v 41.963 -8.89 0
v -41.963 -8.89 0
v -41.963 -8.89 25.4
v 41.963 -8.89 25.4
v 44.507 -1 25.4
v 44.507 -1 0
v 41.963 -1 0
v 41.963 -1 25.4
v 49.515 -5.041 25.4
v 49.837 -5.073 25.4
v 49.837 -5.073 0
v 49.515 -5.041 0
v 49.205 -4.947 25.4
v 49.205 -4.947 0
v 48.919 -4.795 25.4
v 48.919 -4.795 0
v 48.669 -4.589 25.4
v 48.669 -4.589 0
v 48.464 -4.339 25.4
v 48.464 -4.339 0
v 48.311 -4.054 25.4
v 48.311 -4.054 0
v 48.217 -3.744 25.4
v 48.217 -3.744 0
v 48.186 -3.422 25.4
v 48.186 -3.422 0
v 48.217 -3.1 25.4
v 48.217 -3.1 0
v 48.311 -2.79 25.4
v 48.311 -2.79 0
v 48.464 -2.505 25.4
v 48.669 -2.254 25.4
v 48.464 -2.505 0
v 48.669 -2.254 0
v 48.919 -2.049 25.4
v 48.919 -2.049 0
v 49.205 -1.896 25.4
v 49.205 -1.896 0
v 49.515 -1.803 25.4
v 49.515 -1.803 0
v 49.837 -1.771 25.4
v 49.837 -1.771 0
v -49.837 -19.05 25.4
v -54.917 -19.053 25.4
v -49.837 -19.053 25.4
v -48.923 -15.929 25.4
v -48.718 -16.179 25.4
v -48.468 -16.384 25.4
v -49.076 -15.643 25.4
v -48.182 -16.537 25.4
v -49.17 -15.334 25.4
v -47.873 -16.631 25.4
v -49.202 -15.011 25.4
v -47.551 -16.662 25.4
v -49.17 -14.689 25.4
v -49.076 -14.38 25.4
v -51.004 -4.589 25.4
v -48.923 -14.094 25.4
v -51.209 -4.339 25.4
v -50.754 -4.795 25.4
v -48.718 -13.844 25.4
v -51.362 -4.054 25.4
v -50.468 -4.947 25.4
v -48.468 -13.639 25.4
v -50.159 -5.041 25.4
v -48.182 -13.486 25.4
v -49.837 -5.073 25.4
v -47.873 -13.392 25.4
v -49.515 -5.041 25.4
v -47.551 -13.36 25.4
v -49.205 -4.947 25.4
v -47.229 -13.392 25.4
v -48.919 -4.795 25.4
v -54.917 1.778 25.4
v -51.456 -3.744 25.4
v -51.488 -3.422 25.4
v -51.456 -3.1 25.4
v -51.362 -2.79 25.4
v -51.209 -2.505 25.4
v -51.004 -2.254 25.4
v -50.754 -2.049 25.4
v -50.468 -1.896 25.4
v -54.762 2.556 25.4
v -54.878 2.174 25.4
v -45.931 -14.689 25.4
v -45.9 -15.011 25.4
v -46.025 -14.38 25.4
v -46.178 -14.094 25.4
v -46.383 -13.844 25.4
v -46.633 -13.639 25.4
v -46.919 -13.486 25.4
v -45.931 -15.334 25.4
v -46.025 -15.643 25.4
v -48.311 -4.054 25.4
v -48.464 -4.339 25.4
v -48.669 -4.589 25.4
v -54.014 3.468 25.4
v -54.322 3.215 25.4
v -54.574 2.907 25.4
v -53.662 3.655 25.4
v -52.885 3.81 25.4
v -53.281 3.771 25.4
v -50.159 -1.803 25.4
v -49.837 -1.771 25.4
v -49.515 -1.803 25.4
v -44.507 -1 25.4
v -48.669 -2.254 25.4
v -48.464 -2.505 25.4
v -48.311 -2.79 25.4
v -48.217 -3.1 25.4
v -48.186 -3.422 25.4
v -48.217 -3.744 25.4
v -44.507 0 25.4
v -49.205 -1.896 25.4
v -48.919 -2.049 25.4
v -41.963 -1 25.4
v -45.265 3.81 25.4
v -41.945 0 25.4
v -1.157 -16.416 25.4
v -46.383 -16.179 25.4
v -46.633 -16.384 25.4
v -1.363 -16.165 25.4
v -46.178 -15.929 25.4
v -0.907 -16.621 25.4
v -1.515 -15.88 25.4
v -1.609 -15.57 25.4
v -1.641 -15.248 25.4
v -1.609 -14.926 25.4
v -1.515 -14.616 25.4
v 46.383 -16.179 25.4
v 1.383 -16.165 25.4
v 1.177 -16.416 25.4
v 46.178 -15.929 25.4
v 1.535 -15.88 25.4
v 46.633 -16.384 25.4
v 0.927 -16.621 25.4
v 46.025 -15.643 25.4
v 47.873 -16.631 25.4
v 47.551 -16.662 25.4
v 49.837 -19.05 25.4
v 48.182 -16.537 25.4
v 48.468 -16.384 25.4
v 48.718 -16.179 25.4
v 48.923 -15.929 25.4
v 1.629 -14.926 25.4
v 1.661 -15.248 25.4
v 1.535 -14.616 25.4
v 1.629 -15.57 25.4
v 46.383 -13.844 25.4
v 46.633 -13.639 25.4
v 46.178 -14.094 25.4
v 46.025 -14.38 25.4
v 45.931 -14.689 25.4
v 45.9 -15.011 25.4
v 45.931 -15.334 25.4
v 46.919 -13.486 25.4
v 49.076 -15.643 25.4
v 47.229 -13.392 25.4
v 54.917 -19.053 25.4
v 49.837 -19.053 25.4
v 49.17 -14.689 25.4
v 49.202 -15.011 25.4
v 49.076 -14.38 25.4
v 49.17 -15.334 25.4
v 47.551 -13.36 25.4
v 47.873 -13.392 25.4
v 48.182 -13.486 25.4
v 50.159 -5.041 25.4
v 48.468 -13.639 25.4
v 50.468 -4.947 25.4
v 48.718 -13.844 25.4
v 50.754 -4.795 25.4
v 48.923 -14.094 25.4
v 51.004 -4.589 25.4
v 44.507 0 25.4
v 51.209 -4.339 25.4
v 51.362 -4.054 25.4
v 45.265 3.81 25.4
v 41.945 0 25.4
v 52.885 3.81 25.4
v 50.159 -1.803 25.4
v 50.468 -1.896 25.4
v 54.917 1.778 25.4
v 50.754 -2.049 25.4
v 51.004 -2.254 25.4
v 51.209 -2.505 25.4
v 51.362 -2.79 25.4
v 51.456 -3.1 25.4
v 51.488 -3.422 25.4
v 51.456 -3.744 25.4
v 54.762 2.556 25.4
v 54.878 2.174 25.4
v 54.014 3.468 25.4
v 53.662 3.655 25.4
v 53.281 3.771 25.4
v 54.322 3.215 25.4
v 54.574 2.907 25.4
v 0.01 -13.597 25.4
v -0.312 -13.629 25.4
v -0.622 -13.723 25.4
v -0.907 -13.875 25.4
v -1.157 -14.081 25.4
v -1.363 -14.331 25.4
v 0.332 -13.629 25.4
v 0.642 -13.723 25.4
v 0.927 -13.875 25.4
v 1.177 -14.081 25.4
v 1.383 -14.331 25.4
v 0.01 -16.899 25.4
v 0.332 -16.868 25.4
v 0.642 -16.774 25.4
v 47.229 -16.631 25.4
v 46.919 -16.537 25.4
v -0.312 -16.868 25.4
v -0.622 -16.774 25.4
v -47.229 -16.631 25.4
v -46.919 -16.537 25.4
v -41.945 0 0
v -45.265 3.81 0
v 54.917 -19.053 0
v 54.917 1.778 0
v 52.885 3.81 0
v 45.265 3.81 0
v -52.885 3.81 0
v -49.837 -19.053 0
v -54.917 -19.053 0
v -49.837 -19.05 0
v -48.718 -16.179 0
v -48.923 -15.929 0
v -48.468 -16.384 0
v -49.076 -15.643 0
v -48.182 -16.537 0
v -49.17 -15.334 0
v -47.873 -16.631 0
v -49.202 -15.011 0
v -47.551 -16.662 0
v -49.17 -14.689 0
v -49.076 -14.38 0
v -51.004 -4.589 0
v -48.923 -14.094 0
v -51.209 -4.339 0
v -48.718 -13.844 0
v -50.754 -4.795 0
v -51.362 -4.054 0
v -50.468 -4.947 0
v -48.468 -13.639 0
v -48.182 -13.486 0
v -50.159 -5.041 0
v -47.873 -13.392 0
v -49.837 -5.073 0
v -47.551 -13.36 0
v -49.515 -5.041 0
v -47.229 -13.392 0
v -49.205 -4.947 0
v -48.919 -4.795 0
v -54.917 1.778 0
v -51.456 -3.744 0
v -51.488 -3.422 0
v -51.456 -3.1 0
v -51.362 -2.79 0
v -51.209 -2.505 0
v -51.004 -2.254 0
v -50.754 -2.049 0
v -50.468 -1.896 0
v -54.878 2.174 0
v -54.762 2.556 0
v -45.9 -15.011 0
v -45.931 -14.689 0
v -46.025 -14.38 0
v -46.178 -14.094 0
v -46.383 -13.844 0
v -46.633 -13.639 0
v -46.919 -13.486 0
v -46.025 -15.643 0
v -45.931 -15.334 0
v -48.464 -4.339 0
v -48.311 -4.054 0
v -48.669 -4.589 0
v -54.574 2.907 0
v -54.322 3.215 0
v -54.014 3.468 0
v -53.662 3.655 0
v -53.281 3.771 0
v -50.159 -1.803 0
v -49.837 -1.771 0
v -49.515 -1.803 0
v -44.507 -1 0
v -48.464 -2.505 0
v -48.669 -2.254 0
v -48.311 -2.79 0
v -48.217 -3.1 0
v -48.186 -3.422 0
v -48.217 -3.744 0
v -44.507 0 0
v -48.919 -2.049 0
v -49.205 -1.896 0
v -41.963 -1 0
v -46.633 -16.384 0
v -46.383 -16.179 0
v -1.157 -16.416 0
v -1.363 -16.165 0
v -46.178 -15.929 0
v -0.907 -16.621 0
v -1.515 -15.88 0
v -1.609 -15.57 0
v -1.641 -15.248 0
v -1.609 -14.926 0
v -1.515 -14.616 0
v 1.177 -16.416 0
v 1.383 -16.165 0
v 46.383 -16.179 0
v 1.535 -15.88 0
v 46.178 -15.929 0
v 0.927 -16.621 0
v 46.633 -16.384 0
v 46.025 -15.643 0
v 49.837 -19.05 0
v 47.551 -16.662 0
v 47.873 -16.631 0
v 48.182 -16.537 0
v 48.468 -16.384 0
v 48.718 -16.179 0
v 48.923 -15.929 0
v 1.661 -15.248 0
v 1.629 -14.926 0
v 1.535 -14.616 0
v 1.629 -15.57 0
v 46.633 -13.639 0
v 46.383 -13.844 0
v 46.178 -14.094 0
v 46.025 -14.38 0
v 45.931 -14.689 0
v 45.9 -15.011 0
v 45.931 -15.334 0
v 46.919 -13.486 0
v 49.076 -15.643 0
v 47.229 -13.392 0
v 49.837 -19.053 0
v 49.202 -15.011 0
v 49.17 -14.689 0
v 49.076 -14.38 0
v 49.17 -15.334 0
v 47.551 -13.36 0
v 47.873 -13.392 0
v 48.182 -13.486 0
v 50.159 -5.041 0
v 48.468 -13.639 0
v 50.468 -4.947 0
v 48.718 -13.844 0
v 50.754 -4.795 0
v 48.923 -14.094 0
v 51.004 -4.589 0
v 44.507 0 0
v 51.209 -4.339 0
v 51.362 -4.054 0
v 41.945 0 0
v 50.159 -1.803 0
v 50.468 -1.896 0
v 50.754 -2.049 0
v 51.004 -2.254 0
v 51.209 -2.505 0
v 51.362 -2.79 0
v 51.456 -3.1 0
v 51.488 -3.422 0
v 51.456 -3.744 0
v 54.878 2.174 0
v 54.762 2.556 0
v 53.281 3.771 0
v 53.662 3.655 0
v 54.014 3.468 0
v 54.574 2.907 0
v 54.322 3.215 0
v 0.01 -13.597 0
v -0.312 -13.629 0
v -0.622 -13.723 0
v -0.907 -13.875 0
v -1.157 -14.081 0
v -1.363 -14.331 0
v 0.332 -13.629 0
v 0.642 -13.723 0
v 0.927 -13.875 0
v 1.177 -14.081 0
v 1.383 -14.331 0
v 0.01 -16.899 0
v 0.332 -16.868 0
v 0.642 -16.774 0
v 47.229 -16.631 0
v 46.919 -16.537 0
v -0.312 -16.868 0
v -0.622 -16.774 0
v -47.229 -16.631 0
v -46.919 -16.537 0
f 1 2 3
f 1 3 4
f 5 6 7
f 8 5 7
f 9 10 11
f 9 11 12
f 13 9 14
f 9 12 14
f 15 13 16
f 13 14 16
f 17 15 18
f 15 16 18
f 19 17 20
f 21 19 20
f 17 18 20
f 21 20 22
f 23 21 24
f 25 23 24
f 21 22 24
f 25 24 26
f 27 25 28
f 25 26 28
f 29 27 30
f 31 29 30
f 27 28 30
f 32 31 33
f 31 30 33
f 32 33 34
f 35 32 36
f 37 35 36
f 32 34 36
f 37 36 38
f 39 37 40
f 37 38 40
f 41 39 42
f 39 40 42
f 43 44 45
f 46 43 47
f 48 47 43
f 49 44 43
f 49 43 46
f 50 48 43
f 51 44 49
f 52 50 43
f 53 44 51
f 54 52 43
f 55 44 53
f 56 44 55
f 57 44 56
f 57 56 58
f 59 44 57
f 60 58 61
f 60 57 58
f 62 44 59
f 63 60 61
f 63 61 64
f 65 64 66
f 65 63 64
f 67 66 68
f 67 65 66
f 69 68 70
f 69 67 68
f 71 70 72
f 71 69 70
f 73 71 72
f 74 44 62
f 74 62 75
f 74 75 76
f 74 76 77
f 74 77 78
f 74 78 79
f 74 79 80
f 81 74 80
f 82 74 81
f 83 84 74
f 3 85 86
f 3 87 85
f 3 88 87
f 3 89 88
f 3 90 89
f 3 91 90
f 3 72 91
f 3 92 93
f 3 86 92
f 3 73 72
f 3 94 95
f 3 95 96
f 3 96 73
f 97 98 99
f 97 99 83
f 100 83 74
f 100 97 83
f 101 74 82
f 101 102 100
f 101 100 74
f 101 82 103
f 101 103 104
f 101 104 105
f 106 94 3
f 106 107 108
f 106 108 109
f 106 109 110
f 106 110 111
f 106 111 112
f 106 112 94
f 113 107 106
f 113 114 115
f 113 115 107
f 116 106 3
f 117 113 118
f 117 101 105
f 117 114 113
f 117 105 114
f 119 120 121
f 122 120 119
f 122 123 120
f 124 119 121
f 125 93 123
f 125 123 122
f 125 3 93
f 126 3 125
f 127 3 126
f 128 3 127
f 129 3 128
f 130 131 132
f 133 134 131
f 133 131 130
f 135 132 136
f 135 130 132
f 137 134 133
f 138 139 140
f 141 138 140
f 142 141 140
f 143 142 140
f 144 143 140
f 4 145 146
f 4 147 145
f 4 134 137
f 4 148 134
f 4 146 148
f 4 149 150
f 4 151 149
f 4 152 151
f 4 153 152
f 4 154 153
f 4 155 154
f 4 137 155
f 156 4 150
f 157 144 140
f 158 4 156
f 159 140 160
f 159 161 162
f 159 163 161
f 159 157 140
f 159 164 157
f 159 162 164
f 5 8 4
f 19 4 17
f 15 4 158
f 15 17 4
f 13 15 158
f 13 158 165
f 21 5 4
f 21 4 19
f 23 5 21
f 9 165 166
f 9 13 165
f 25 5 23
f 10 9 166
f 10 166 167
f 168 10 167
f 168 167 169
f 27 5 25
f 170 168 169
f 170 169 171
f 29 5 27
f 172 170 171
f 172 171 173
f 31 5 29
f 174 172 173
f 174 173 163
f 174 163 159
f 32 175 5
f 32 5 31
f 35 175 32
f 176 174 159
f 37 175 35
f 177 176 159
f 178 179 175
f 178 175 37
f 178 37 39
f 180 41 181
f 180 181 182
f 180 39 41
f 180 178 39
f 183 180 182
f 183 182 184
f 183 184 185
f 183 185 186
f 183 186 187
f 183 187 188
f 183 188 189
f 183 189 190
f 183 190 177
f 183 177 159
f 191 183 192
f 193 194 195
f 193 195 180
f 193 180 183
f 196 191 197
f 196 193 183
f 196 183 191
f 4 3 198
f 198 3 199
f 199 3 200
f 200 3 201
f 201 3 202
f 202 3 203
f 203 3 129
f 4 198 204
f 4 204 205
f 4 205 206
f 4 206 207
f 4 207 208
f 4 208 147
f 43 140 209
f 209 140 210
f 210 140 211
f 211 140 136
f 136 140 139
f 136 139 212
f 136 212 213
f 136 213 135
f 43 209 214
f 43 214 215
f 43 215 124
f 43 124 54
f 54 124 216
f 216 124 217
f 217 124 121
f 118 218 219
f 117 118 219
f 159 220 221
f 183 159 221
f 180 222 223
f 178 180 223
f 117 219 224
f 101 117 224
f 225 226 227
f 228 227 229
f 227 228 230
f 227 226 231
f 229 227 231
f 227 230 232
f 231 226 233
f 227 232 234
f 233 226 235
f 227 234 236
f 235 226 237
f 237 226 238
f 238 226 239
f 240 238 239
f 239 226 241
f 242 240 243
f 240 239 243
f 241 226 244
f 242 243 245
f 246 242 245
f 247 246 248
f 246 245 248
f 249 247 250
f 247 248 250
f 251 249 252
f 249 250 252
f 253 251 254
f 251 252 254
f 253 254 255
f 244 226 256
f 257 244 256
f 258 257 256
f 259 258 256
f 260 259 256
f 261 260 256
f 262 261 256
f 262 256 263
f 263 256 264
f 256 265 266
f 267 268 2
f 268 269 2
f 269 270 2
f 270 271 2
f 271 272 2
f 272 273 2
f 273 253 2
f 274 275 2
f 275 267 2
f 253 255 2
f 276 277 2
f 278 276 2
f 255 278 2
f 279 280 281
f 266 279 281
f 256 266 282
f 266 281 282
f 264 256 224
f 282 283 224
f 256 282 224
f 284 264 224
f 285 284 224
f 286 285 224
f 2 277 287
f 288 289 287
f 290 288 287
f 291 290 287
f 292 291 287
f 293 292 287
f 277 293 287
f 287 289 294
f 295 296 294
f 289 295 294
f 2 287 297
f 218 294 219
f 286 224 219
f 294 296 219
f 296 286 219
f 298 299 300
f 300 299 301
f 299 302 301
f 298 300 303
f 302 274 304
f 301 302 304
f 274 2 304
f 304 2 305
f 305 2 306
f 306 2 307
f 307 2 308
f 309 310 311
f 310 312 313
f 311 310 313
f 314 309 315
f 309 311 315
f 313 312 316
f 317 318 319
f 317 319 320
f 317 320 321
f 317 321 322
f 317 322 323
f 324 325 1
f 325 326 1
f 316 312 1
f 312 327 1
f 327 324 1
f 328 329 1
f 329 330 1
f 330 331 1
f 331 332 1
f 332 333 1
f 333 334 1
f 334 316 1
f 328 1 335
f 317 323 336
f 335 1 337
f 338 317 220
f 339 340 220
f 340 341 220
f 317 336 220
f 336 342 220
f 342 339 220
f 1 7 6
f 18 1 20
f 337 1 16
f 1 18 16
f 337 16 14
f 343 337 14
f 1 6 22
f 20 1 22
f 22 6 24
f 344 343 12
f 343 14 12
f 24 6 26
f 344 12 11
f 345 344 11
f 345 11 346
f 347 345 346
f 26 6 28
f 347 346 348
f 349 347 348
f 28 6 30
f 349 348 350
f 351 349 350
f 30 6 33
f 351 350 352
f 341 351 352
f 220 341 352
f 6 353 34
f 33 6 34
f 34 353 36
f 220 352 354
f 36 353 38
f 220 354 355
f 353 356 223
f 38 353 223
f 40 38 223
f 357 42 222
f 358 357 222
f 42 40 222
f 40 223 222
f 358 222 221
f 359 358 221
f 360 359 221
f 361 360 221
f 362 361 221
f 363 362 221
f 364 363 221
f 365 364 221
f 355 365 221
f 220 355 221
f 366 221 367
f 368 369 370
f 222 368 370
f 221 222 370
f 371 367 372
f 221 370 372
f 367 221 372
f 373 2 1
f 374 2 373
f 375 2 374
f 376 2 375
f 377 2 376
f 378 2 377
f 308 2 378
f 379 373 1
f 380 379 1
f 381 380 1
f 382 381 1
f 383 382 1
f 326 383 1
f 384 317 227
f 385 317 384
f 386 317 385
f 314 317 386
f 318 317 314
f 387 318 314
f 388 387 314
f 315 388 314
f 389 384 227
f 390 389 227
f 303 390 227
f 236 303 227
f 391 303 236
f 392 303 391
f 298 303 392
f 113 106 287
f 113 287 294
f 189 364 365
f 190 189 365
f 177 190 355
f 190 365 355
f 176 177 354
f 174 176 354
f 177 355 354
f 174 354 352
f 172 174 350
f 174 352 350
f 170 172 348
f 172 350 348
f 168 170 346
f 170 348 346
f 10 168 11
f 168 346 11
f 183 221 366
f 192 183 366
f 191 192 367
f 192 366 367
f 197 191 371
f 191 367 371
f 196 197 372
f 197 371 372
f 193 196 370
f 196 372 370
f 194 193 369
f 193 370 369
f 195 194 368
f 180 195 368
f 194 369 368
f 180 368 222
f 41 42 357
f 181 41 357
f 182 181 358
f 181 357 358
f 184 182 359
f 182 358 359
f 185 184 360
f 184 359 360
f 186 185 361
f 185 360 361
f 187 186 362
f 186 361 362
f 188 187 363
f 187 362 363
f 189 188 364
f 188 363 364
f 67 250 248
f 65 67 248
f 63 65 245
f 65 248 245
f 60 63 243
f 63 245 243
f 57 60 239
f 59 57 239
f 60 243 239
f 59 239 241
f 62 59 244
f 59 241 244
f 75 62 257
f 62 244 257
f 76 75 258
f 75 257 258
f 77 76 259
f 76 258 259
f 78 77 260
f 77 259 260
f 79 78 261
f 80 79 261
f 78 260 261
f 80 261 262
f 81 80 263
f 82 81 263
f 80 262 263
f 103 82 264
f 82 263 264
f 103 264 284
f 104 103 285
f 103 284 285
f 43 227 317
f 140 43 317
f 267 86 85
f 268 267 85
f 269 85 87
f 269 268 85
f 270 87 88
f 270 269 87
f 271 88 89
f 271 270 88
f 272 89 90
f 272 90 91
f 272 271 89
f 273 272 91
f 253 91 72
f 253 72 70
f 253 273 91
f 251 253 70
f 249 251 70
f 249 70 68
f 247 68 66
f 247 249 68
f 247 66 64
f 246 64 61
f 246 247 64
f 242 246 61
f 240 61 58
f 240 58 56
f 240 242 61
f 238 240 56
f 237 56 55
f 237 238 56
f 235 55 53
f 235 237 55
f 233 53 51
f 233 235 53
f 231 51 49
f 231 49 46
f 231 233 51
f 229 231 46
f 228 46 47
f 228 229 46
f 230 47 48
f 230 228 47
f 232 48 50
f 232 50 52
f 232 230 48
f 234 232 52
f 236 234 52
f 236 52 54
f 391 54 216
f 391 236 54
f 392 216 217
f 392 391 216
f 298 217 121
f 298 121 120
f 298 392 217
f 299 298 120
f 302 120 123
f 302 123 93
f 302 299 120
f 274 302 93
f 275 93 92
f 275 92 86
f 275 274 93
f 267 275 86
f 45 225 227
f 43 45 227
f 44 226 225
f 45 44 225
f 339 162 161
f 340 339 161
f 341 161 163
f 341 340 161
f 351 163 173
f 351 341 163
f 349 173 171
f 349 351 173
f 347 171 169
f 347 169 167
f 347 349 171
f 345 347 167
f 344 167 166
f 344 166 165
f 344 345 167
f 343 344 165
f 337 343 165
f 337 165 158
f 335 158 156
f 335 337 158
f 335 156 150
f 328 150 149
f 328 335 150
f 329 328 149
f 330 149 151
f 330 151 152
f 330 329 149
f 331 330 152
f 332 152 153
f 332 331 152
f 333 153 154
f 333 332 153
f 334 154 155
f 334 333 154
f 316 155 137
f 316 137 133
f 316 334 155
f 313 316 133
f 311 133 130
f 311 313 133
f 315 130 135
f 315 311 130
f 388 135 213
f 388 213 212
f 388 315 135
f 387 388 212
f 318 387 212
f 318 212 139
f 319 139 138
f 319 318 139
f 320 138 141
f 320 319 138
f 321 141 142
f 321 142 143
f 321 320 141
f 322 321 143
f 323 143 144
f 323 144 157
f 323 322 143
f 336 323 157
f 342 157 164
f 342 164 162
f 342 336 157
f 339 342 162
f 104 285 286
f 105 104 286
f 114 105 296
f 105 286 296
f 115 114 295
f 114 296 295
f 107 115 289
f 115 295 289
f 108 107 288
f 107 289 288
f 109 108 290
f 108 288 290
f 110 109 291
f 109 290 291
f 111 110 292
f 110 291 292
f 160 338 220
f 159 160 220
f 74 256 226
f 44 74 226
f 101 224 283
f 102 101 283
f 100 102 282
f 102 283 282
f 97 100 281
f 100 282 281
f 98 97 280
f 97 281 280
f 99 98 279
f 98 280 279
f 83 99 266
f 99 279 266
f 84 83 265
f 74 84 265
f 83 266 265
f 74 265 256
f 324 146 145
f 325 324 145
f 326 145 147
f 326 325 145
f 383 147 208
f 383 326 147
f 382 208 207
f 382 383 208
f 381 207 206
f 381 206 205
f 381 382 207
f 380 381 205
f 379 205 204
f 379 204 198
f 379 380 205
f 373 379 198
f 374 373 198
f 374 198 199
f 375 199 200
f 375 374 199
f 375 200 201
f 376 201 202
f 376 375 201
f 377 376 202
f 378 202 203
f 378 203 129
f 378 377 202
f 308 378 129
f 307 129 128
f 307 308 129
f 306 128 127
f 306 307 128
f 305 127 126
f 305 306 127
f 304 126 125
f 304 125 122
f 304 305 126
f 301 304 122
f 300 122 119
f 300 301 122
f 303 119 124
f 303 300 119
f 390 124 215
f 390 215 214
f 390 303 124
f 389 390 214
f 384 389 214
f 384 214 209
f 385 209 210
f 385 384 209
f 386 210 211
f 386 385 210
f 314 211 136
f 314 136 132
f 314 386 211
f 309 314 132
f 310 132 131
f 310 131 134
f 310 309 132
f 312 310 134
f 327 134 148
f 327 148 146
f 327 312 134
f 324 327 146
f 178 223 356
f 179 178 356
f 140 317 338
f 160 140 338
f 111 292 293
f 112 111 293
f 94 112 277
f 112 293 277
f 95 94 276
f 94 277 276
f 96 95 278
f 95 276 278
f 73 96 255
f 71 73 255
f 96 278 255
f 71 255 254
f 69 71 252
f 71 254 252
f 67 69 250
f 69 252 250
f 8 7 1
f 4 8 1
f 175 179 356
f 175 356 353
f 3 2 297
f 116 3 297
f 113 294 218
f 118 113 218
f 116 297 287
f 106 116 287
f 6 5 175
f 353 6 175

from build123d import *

# Parameters (mm, degrees)
F0_R     = 1.651
F0_W     = 83.9253333333
F0_H     = 2.54
F0_W_2   = 0.7576921484
F0_H_2   = 0.9999891111
F1_DEPTH = 25.4


with BuildPart() as f1:
    # F0 (on Top) → F1 (new body)
    with BuildSketch(Plane.XY):
        Polygon((-45.2646666667, -11.43), (-49.8366666667, -11.43), (-49.8366666667, -19.05), (49.8366666667, -19.05), (49.8366666667, -11.43), (45.2646666667, -11.43), (41.9626666667, -11.43), (-41.9626666667, -11.43), align=None)
        with Locations((-47.5506666667, -15.0114614516)):
            Circle(F0_R, mode=Mode.SUBTRACT)
        with Locations((0.0100299507, -15.2482278645)):
            Circle(F0_R, mode=Mode.SUBTRACT)
        with Locations((47.5506666667, -15.0114614516)):
            Circle(F0_R, mode=Mode.SUBTRACT)
        with BuildLine():
            Line((-49.8366666667, -19.05), (-49.8366666667, -11.43))
            Line((-49.8366666667, -11.43), (-49.8366666667, -5.0728137152))
            ThreePointArc((-49.8366666667, -5.0728137152), (-51.4876666667, -3.4218137152), (-49.8366666667, -1.7708137152))
            Line((-49.8366666667, -1.7708137152), (-49.8366666667, 1.778))
            Line((-49.8366666667, 1.778), (-54.9166666667, 1.778))
            Line((-54.9166666667, 1.778), (-54.9166666667, -19.05301027))
            Line((-54.9166666667, -19.05301027), (-49.8366666667, -19.05301027))
            Line((-49.8366666667, -19.05301027), (-49.8366666667, -19.05))
        make_face()
        Polygon((-45.2646666667, -0.9999891111), (-45.2646666667, -11.43), (-41.9626666667, -11.43), (-41.9626666667, -8.89), (-41.9626666667, -0.9999891111), (-44.5069745183, -0.9999891111), align=None)
        with Locations((0, -10.16)):
            Rectangle(F0_W, F0_H)
        with Locations((-44.8858205925, -0.4999945555)):
            Rectangle(F0_W_2, F0_H_2)
        with BuildLine():
            Line((49.8366666667, -11.43), (49.8366666667, -19.05))
            Line((49.8366666667, -19.05), (49.8366666667, -19.05301027))
            Line((49.8366666667, -19.05301027), (54.9166666667, -19.05301027))
            Line((54.9166666667, -19.05301027), (54.9166666667, 1.778))
            Line((54.9166666667, 1.778), (49.8366666667, 1.778))
            Line((49.8366666667, 1.778), (49.8366666667, -1.7708137152))
            ThreePointArc((49.8366666667, -1.7708137152), (51.0040999624, -2.2543804195), (51.4876666667, -3.4218137152))
            ThreePointArc((51.4876666667, -3.4218137152), (51.0040999624, -4.589247011), (49.8366666667, -5.0728137152))
            Line((49.8366666667, -5.0728137152), (49.8366666667, -11.43))
        make_face()
        Polygon((41.9626666667, -8.89), (41.9626666667, -11.43), (45.2646666667, -11.43), (45.2646666667, -0.9999891111), (44.5069745183, -0.9999891111), (41.9626666667, -0.9999891111), align=None)
        Polygon((-45.2646666667, 1.778), (-45.2646666667, 0), (-44.5069745183, 0), (-41.94509238, 0), (-45.2646666667, 3.81), align=None)
        with BuildLine():
            Line((-54.9166666667, 1.778), (-49.8366666667, 1.778))
            Line((-49.8366666667, 1.778), (-45.2646666667, 1.778))
            Line((-45.2646666667, 1.778), (-45.2646666667, 3.81))
            Line((-45.2646666667, 3.81), (-52.8846666667, 3.81))
            ThreePointArc((-52.8846666667, 3.81), (-54.321507646, 3.2148409794), (-54.9166666667, 1.778))
        make_face()
        with Locations((44.8858205925, -0.4999945555)):
            Rectangle(F0_W_2, F0_H_2)
        with BuildLine():
            Line((49.8366666667, 1.778), (54.9166666667, 1.778))
            ThreePointArc((54.9166666667, 1.778), (54.321507646, 3.2148409794), (52.8846666667, 3.81))
            Line((52.8846666667, 3.81), (47.8046666667, 3.81))
            Line((47.8046666667, 3.81), (45.2646666667, 3.81))
            Line((45.2646666667, 3.81), (45.2646666667, 1.778))
            Line((45.2646666667, 1.778), (49.8366666667, 1.778))
        make_face()
        Polygon((44.5069745183, 0), (45.2646666667, 0), (45.2646666667, 1.778), (45.2646666667, 3.81), (41.94509238, 0), align=None)
        with BuildLine():
            Line((-49.8366666667, -5.0728137152), (-49.8366666667, -11.43))
            Line((-49.8366666667, -11.43), (-45.2646666667, -11.43))
            Line((-45.2646666667, -11.43), (-45.2646666667, -0.9999891111))
            Line((-45.2646666667, -0.9999891111), (-45.2646666667, 0))
            Line((-45.2646666667, 0), (-45.2646666667, 1.778))
            Line((-45.2646666667, 1.778), (-49.8366666667, 1.778))
            Line((-49.8366666667, 1.778), (-49.8366666667, -1.7708137152))
            ThreePointArc((-49.8366666667, -1.7708137152), (-48.6692333709, -2.2543804195), (-48.1856666667, -3.4218137152))
            ThreePointArc((-48.1856666667, -3.4218137152), (-48.6692333709, -4.589247011), (-49.8366666667, -5.0728137152))
        make_face()
        with BuildLine():
            Line((45.2646666667, -11.43), (49.8366666667, -11.43))
            Line((49.8366666667, -11.43), (49.8366666667, -5.0728137152))
            ThreePointArc((49.8366666667, -5.0728137152), (48.1856666667, -3.4218137152), (49.8366666667, -1.7708137152))
            Line((49.8366666667, -1.7708137152), (49.8366666667, 1.778))
            Line((49.8366666667, 1.778), (45.2646666667, 1.778))
            Line((45.2646666667, 1.778), (45.2646666667, 0))
            Line((45.2646666667, 0), (45.2646666667, -0.9999891111))
            Line((45.2646666667, -0.9999891111), (45.2646666667, -11.43))
        make_face()
    extrude(amount=F1_DEPTH)


solid = f1.part
